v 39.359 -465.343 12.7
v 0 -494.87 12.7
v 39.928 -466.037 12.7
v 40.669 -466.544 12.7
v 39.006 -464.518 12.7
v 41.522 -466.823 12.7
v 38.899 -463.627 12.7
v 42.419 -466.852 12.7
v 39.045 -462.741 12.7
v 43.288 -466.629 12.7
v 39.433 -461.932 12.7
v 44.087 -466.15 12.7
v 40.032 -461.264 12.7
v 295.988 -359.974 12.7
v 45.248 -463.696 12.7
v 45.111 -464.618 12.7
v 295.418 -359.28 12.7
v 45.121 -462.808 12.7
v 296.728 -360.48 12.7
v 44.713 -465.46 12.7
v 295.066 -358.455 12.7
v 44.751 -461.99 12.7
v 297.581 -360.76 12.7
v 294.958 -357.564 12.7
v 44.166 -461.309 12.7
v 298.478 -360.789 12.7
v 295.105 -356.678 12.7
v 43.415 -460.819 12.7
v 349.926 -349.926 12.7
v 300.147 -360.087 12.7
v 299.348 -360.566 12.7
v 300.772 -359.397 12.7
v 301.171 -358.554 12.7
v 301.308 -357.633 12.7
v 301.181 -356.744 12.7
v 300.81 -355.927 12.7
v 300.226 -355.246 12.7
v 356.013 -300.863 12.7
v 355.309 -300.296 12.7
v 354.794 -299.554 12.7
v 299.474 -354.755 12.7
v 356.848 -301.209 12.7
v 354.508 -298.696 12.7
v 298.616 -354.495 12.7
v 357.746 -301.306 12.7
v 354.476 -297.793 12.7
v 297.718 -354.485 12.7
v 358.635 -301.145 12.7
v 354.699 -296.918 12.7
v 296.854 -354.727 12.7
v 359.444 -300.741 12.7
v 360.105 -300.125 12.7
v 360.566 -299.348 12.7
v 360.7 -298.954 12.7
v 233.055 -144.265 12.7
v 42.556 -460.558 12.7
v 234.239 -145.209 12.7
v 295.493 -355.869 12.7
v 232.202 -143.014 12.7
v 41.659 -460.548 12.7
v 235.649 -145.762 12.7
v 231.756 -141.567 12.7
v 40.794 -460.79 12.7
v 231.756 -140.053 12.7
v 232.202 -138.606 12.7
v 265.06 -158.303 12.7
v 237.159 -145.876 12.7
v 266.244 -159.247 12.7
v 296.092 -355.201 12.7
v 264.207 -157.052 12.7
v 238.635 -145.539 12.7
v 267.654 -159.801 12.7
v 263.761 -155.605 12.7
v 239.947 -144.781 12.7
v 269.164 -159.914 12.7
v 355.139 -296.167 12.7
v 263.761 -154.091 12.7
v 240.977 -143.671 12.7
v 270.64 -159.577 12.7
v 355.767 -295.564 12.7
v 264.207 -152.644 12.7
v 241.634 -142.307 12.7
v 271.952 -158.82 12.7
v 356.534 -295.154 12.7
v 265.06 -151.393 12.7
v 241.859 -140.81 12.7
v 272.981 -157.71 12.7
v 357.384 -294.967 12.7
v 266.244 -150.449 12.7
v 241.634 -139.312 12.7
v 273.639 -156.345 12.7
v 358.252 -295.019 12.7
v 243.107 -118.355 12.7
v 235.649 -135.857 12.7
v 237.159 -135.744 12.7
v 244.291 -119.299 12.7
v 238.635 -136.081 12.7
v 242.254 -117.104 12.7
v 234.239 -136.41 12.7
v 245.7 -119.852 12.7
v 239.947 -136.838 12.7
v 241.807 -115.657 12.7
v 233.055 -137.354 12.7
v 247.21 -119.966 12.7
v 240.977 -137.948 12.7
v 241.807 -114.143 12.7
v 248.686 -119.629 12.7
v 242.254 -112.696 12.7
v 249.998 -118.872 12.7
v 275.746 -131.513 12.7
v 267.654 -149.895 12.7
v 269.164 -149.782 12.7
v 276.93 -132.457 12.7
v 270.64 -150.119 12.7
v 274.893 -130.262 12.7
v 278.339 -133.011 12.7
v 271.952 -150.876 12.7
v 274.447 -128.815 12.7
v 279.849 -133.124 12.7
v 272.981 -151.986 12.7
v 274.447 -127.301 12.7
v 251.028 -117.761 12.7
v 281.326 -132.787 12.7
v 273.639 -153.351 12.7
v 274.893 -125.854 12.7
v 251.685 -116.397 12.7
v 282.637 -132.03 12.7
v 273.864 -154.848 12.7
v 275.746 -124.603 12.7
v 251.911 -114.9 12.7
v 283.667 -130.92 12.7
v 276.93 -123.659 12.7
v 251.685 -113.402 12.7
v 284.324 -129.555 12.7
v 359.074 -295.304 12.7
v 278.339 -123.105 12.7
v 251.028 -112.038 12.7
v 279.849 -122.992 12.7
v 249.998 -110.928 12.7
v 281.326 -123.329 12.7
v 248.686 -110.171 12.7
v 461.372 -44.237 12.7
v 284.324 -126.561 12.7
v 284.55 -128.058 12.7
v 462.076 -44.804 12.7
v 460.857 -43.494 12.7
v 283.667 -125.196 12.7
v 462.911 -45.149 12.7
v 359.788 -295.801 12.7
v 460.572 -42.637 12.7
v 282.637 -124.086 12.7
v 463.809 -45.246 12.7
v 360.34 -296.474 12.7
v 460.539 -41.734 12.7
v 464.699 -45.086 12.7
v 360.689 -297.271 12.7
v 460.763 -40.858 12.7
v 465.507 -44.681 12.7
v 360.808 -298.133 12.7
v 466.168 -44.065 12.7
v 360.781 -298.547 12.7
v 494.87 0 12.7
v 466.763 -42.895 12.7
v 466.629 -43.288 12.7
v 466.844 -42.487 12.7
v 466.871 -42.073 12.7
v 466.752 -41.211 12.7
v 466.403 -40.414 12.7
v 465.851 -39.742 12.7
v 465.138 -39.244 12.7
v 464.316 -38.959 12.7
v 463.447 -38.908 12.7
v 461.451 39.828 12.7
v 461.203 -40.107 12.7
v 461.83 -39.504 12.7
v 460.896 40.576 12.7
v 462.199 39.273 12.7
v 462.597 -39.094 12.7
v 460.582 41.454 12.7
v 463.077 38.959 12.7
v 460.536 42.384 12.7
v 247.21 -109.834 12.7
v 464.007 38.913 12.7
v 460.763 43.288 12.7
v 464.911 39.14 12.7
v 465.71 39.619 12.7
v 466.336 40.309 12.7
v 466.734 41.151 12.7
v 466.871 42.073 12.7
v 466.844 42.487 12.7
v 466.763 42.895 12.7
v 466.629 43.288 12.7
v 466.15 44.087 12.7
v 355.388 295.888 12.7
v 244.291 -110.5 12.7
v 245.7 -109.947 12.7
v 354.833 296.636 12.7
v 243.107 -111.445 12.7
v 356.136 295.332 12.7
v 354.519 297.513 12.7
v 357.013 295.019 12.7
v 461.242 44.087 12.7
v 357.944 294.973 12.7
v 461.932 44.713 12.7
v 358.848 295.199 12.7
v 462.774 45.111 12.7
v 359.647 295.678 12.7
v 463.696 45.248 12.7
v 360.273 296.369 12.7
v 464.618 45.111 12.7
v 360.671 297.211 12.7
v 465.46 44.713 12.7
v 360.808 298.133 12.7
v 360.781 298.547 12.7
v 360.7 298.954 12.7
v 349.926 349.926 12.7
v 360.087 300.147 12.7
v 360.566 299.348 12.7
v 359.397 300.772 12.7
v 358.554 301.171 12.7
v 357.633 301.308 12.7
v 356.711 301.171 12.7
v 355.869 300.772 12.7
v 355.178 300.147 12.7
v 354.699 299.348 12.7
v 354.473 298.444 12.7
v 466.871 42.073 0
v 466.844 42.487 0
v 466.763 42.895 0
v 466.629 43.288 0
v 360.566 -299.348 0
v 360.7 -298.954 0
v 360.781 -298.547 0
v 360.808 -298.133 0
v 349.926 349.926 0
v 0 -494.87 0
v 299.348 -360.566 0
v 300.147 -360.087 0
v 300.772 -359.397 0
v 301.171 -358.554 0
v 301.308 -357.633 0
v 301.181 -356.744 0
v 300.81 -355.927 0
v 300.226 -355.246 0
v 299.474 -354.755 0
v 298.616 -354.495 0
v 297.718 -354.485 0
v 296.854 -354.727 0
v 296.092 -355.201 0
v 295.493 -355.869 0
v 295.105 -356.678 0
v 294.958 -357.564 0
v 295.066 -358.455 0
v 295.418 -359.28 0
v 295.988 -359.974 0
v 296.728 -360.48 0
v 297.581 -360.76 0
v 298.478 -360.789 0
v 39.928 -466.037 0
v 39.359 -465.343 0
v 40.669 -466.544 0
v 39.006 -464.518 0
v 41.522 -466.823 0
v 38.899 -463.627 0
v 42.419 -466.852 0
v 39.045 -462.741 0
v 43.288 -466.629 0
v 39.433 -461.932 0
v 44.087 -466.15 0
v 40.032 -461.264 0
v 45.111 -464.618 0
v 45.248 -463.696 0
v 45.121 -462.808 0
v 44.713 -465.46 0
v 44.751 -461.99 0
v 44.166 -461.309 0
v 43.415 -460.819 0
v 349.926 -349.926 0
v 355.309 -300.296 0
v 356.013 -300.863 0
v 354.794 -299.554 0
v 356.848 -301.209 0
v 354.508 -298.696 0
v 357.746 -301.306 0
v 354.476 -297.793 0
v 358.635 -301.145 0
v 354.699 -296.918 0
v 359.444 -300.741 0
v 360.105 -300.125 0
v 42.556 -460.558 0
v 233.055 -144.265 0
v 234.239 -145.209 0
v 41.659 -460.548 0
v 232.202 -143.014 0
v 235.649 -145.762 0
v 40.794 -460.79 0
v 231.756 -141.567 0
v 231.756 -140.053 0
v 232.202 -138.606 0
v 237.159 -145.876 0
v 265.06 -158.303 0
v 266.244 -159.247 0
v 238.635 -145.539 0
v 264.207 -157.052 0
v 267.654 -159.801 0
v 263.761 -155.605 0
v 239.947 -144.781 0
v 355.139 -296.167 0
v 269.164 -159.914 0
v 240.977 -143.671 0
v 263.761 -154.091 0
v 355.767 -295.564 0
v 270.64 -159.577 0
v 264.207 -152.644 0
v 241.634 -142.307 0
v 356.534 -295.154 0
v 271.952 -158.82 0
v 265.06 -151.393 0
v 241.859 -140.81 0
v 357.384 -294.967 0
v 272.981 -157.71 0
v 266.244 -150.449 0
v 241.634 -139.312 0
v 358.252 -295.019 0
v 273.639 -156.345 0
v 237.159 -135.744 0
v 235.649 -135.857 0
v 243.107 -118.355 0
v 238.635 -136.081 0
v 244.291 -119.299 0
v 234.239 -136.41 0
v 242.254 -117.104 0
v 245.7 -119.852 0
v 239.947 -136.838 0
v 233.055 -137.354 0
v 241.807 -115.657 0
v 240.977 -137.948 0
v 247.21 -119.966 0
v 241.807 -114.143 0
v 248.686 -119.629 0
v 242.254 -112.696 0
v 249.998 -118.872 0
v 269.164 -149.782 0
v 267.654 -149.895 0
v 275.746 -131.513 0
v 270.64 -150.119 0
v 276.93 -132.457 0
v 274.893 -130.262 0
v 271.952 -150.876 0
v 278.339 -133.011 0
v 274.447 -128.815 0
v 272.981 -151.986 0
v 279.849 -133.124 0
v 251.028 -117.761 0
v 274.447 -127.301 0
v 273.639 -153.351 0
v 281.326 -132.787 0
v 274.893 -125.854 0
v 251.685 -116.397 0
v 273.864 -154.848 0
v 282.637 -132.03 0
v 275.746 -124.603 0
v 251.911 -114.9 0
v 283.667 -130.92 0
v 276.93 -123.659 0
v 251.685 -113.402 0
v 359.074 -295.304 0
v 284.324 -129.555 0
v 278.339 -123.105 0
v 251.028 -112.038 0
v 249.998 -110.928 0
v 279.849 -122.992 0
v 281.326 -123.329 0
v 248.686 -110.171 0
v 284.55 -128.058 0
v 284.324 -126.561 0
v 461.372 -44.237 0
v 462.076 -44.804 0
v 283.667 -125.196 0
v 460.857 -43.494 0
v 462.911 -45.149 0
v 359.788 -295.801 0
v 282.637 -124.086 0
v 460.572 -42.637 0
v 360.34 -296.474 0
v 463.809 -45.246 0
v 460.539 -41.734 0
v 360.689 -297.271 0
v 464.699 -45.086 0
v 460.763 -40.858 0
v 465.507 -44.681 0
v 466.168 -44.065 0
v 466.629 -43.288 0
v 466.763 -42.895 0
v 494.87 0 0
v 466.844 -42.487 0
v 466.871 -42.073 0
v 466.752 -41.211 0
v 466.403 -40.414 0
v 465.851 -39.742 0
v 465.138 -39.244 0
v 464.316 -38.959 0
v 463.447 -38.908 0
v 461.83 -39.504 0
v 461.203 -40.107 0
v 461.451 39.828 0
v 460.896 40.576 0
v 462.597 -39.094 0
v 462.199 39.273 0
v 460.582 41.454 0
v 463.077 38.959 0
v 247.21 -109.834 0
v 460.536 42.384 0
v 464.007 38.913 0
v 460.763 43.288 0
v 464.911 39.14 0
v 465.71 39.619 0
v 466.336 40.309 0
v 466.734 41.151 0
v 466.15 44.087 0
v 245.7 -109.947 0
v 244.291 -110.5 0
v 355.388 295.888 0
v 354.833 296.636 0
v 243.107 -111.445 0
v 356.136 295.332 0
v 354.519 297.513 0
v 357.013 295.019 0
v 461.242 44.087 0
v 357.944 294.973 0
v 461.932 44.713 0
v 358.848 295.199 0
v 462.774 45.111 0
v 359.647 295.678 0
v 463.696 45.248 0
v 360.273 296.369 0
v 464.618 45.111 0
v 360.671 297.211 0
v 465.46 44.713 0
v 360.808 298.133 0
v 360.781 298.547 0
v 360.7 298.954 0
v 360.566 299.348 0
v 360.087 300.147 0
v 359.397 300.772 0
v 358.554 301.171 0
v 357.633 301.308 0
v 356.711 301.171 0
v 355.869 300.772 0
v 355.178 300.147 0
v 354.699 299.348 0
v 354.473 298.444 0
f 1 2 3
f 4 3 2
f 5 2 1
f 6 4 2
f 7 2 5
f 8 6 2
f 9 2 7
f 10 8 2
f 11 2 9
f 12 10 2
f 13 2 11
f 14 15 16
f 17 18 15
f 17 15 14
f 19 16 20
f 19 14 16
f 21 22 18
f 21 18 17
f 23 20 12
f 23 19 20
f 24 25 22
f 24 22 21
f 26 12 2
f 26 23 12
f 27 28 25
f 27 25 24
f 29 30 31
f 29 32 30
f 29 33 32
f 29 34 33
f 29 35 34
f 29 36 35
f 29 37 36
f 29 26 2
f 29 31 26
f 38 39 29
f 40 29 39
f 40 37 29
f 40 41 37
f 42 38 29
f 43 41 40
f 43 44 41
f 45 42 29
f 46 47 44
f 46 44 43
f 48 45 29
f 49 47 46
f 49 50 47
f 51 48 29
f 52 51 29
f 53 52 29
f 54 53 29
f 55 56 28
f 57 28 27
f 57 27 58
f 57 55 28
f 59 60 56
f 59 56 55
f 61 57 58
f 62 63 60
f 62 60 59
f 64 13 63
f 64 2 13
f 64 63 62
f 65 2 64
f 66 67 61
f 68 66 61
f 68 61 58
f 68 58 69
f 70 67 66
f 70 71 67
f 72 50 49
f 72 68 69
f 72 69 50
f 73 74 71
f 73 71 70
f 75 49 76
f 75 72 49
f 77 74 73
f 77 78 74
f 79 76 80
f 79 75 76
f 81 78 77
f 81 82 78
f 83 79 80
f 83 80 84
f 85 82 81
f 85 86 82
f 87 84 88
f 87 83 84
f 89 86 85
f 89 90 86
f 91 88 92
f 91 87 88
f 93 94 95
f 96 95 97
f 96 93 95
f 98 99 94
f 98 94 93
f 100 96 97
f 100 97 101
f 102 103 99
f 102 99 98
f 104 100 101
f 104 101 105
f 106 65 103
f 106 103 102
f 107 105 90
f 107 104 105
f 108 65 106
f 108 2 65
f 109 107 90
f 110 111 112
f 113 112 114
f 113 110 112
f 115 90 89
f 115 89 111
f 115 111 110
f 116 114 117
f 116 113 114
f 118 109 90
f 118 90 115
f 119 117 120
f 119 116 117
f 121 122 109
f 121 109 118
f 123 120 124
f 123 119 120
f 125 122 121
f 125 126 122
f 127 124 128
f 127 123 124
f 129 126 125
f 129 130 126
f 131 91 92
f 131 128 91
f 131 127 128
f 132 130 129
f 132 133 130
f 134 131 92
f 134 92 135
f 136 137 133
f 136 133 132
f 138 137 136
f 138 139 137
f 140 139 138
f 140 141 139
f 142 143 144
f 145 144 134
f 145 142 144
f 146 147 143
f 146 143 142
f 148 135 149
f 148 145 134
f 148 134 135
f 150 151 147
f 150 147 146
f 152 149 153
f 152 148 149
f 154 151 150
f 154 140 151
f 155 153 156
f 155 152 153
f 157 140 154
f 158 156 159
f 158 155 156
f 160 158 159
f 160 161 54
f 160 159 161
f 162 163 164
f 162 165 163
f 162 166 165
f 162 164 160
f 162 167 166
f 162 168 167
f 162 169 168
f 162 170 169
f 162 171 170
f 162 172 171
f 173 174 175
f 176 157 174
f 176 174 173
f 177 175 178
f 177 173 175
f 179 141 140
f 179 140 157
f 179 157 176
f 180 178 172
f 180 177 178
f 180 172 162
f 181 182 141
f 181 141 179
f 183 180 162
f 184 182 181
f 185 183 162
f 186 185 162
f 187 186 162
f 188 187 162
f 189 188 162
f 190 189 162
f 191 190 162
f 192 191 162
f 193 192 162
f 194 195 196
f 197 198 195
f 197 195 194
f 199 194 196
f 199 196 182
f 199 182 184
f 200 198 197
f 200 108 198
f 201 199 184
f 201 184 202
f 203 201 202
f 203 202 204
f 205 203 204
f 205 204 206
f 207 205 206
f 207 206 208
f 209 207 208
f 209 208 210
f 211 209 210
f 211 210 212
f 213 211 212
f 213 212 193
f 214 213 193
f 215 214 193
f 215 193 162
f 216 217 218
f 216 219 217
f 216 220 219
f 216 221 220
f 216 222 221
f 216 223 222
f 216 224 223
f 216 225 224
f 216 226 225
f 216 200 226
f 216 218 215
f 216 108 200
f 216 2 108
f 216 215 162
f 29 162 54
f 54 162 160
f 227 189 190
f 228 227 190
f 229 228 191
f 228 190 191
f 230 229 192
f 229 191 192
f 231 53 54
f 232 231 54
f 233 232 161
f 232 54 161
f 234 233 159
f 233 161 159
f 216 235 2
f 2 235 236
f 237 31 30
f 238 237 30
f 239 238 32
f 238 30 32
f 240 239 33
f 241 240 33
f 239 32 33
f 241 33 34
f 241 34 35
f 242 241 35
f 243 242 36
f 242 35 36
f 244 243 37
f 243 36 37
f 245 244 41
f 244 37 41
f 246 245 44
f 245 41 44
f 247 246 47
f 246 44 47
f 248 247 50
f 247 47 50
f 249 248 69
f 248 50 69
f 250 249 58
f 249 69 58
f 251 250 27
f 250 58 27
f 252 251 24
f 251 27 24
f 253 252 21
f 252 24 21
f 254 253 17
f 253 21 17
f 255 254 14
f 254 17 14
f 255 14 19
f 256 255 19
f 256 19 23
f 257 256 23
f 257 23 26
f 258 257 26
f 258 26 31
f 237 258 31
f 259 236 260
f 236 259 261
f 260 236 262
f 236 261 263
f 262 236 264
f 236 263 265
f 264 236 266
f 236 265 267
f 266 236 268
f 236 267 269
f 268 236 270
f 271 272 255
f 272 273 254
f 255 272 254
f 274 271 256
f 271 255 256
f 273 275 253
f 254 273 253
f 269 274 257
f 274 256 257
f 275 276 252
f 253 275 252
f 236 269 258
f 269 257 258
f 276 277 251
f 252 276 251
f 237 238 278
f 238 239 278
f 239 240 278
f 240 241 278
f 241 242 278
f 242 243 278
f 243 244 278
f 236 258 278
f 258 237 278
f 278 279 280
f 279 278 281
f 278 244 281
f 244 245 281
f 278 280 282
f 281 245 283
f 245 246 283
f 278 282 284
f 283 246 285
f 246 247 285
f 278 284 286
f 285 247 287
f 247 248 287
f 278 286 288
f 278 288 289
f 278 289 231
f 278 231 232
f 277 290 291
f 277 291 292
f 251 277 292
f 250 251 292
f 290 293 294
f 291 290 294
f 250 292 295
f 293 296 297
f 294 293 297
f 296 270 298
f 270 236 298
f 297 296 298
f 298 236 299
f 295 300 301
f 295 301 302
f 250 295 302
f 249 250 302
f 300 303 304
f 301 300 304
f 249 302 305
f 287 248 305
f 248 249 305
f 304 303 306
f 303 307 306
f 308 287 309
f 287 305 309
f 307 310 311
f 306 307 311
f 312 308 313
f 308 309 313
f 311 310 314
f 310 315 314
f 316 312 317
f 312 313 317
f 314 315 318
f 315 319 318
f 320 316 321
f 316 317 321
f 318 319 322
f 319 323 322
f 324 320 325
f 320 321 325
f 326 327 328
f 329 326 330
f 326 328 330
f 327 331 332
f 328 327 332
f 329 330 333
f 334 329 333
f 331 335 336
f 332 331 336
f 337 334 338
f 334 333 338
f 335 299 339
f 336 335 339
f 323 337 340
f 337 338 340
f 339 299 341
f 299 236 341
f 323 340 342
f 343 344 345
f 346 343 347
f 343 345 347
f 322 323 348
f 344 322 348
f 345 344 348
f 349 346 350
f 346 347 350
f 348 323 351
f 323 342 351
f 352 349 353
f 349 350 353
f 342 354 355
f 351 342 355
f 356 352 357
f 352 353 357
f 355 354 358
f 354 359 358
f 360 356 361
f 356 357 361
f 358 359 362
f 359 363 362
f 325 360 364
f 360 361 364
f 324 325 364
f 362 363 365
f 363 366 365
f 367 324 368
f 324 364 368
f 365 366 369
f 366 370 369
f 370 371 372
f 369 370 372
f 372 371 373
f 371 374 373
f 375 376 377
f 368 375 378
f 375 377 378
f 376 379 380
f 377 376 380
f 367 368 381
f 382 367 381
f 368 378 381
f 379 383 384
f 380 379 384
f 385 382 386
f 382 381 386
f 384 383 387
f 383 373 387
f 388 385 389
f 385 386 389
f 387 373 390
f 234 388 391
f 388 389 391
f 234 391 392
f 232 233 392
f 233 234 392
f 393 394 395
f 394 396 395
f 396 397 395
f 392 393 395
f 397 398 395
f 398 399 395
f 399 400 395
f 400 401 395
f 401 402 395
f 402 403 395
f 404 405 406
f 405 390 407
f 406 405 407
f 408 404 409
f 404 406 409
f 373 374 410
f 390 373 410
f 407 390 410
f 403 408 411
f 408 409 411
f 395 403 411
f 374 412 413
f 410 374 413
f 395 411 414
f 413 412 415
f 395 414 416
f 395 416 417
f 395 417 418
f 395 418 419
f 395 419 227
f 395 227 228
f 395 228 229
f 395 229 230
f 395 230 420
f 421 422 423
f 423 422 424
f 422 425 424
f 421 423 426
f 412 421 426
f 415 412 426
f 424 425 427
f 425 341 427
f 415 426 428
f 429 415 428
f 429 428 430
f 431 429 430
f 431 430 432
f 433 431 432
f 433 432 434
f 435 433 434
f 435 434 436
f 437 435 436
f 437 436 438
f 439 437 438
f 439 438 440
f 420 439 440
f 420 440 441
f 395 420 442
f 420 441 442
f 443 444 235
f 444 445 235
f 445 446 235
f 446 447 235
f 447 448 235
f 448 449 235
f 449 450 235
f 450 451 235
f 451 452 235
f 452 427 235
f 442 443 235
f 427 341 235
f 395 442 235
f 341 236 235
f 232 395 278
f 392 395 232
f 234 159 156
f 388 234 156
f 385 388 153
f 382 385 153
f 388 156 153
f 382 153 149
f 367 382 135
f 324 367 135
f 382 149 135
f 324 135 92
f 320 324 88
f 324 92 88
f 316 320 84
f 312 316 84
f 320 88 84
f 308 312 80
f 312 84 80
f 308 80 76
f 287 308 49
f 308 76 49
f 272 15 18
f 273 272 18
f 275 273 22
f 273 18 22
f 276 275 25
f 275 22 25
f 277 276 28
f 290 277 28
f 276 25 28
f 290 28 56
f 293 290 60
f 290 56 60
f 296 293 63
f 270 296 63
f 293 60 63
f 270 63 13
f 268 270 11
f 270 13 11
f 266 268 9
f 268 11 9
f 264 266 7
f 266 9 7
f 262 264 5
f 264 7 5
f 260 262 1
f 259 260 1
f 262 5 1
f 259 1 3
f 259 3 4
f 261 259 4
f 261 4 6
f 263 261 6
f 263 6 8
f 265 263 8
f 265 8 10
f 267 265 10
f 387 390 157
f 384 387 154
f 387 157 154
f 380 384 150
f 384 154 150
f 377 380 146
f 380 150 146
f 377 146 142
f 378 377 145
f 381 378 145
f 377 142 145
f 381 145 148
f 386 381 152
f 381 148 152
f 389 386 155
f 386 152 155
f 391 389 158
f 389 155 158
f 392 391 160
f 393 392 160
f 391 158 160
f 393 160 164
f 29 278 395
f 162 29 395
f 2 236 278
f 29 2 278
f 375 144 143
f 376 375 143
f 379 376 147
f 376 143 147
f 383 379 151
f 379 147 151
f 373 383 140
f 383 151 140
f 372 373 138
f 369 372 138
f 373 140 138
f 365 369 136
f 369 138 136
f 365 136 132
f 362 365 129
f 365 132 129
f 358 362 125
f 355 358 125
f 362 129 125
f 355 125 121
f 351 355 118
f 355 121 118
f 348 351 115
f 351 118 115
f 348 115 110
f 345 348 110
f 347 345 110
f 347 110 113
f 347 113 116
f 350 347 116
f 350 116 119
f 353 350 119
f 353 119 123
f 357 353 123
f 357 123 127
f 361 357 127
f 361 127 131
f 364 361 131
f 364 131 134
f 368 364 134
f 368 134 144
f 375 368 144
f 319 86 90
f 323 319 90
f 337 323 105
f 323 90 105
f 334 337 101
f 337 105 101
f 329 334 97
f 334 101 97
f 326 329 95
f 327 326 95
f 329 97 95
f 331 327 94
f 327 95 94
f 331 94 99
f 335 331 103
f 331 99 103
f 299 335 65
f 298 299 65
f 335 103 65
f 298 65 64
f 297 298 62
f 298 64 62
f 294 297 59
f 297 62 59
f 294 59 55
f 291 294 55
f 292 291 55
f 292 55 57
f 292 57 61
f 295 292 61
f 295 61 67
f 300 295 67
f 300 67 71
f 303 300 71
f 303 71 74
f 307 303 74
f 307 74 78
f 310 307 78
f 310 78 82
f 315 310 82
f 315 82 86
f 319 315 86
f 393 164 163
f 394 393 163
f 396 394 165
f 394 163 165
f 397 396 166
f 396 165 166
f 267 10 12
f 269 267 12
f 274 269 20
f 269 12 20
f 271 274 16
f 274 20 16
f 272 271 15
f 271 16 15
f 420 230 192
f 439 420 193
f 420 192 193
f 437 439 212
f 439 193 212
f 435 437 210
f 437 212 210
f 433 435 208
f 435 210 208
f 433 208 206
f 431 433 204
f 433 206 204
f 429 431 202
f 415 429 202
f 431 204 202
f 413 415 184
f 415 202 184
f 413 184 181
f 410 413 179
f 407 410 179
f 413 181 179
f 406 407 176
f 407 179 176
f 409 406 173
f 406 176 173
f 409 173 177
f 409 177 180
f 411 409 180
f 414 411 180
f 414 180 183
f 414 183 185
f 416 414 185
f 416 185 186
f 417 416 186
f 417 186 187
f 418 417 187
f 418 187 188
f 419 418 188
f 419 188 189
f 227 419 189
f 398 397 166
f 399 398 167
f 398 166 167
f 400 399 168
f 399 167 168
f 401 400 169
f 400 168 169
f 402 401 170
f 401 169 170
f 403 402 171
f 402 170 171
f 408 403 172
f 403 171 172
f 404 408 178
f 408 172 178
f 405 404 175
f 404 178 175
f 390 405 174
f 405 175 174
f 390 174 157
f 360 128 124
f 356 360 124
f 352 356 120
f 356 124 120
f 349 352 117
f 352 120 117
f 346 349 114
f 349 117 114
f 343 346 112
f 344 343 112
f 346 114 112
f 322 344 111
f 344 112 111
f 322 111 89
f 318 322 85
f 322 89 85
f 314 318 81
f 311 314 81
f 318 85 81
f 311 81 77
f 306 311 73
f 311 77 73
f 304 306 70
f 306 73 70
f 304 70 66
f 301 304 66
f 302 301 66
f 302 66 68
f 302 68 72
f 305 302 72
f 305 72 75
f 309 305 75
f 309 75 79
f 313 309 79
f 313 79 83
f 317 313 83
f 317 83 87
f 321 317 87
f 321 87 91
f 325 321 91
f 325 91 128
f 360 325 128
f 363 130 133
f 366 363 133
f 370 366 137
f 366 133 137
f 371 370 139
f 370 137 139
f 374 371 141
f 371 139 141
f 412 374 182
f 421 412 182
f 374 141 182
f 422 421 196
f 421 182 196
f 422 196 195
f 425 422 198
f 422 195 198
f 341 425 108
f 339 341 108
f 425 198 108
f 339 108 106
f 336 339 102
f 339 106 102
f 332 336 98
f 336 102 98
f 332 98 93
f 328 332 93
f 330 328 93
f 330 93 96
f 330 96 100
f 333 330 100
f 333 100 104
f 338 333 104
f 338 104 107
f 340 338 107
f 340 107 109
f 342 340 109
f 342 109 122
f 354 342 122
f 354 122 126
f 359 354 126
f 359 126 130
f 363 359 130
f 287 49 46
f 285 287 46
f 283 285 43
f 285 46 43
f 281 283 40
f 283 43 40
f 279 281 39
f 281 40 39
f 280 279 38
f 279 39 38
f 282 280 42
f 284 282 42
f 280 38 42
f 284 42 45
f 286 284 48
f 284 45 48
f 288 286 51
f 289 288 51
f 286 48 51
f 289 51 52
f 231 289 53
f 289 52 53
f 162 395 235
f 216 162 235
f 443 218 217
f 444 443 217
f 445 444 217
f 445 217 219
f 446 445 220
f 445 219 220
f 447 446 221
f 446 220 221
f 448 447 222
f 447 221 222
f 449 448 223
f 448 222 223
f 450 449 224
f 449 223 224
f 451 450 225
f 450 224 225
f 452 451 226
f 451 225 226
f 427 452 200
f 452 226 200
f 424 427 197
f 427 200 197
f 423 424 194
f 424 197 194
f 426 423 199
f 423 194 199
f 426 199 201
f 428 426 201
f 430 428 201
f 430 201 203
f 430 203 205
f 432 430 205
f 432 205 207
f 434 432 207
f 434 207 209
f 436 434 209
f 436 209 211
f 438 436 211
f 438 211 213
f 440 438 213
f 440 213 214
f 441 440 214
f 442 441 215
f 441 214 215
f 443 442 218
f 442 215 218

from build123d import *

# Parameters (mm, degrees)
F1_DEPTH = 12.7
F3_DEPTH = 12.701
F4_R     = 5.08
F5_DEPTH = 25.4


with BuildPart() as f1:
    # F0 (on Top) → F1 (new body)
    with BuildSketch(Plane.XY):
        Polygon((349.925731, -349.925731), (494.869714, 0), (349.925731, 349.925731), (0, -494.869714), align=None)
    extrude(amount=F1_DEPTH)

    # F2 (on face) → F3 (cut, through all)
    with BuildSketch(Plane.XY.offset(12.7)):
        with BuildLine():
            ThreePointArc((43.288021, -466.629443), (44.712917, -465.460061), (45.248001, -463.696126))
            ThreePointArc((45.248001, -463.696126), (39.433085, -461.93219), (43.288021, -466.629443))
        make_face()
        with BuildLine():
            ThreePointArc((299.347591, -360.566096), (300.772487, -359.396714), (301.307571, -357.632779))
            ThreePointArc((301.307571, -357.632779), (295.492655, -355.868843), (299.347591, -360.566096))
        make_face()
        with BuildLine():
            ThreePointArc((360.566096, -299.347591), (360.746772, -298.751982), (360.807779, -298.132571))
            ThreePointArc((360.807779, -298.132571), (358.252191, -295.018577), (354.699461, -296.917551))
            Line((354.699461, -296.917551), (357.632779, -298.132571))
            Line((357.632779, -298.132571), (360.566096, -299.347591))
        make_face()
        with BuildLine():
            Line((357.632779, -298.132571), (354.699461, -296.917551))
            ThreePointArc((354.699461, -296.917551), (356.417759, -301.065888), (360.566096, -299.347591))
            Line((360.566096, -299.347591), (357.632779, -298.132571))
        make_face()
        with BuildLine():
            ThreePointArc((466.629443, -43.288021), (466.810119, -42.692412), (466.871126, -42.073001))
            ThreePointArc((466.871126, -42.073001), (464.315537, -38.959007), (460.762808, -40.857981))
            Line((460.762808, -40.857981), (463.696126, -42.073001))
            Line((463.696126, -42.073001), (466.629443, -43.288021))
        make_face()
        with BuildLine():
            Line((463.696126, -42.073001), (460.762808, -40.857981))
            ThreePointArc((460.762808, -40.857981), (462.481106, -45.006318), (466.629443, -43.288021))
            Line((466.629443, -43.288021), (463.696126, -42.073001))
        make_face()
        with BuildLine():
            ThreePointArc((466.629443, 43.288021), (460.582132, 41.453589), (466.871126, 42.073001))
            ThreePointArc((466.871126, 42.073001), (466.810119, 42.692412), (466.629443, 43.288021))
        make_face()
        with BuildLine():
            ThreePointArc((360.566096, 299.347591), (354.518786, 297.513159), (360.807779, 298.132571))
            ThreePointArc((360.807779, 298.132571), (360.746772, 298.751982), (360.566096, 299.347591))
        make_face()
    extrude(amount=-F3_DEPTH, mode=Mode.SUBTRACT)

    # F4 (on face) → F5 (cut)
    with BuildSketch(Plane.XY.offset(12.7)):
        with Locations((246.830538, -114.899813)):
            Circle(F4_R)
        with Locations((279.469849, -128.058023)):
            Circle(F4_R)
        with Locations((268.784191, -154.847956)):
            Circle(F4_R)
        with Locations((236.779314, -140.80974)):
            Circle(F4_R)
    extrude(amount=-F5_DEPTH, mode=Mode.SUBTRACT)


solid = f1.part
